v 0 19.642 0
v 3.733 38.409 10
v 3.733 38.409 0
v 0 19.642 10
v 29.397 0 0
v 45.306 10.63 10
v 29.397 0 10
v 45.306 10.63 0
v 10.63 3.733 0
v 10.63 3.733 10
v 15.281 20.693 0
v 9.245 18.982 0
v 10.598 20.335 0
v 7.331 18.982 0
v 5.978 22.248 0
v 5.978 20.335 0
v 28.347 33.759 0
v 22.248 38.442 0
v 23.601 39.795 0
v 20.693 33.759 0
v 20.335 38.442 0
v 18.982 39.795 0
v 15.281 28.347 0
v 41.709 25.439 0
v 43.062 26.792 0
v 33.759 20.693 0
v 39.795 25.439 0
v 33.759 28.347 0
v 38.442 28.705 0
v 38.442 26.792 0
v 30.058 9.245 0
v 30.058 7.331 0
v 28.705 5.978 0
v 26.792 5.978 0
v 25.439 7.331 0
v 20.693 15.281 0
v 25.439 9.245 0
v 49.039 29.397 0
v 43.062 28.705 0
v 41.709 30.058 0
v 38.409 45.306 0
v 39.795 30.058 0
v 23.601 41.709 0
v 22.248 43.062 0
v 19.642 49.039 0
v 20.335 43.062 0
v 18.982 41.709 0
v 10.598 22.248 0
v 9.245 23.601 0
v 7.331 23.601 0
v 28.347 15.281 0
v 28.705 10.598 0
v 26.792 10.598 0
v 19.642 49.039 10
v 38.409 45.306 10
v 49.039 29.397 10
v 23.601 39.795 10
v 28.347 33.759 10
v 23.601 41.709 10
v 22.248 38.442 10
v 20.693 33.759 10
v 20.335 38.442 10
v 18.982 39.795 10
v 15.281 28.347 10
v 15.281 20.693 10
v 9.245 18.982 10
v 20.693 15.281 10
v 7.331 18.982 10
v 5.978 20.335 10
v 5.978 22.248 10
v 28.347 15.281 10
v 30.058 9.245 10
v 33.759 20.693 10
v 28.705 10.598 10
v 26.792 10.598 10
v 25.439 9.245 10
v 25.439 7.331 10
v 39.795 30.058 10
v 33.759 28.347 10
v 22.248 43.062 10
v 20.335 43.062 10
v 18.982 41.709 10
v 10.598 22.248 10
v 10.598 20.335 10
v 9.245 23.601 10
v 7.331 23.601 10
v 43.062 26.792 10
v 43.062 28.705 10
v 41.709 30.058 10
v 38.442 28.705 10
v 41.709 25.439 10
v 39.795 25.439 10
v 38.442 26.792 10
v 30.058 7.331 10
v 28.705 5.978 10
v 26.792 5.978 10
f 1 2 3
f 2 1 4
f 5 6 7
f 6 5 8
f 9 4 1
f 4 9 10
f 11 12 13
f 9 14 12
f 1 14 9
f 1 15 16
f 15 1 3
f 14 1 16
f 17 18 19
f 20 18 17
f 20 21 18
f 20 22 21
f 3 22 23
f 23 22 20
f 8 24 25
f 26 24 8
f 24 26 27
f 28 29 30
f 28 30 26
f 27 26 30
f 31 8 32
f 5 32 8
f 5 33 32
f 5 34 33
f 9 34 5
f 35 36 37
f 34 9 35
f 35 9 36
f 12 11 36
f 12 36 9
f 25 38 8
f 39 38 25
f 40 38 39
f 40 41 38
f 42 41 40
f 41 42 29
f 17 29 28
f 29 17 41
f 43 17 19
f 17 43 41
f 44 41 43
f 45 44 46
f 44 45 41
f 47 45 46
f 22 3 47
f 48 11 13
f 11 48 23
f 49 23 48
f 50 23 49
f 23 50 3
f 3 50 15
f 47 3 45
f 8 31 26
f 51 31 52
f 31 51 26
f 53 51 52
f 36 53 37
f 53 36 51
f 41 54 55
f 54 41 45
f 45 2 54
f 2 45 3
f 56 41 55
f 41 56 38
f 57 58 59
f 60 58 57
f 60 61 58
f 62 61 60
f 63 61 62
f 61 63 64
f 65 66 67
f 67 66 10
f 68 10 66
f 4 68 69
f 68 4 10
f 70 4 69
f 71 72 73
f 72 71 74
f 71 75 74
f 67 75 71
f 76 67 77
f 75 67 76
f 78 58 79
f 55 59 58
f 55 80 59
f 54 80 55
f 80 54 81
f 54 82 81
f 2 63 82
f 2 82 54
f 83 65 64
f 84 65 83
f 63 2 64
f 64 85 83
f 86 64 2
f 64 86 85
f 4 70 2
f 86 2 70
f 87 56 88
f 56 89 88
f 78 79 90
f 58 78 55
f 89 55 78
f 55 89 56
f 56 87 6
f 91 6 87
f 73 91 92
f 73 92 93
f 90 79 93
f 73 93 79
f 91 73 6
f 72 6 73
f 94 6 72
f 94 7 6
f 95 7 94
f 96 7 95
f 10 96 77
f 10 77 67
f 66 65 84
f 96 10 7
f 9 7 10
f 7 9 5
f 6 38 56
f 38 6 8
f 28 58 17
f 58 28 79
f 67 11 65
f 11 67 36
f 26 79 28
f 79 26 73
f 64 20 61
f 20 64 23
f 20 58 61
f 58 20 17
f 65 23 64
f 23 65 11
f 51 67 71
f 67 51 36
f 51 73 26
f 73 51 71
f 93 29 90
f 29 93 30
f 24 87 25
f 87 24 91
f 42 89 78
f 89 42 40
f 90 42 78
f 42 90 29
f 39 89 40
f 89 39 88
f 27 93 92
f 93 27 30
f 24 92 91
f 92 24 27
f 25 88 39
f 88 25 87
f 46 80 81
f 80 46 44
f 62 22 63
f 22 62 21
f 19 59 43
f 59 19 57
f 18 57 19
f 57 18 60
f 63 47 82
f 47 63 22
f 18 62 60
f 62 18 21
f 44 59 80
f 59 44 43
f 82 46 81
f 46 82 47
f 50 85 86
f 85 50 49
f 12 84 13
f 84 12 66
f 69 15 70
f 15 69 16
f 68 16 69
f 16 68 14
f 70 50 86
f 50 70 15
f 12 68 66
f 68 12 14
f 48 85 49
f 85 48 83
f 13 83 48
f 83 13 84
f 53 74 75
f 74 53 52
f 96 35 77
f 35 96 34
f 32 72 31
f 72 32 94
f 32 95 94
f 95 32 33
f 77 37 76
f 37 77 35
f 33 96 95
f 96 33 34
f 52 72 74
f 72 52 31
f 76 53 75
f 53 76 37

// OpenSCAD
$fn = 32;

// ----------------------------------------------------------------------
// Polygon plate: 8-gon R25, 4 bolt windows
// ----------------------------------------------------------------------

// --- parameters (mm) ---
sides = 8;                // number of polygon sides
plate_r = 25;             // circumscribed radius of the polygon
bore_r = 10;              // centre bore radius
bolts = 4;                // number of bolt windows
ring_r = 16.55;           // bolt-circle radius
bolt_r = 2.5;             // bolt window radius
plate_t = 10;             // plate thickness, Z (extrusion height)

plate_d = 2 * plate_r;  // circumscribed diameter
bore_d = 2 * bore_r;  // centre bore diameter
bolt_d = 2 * bolt_r;  // bolt window diameter
ring_d = 2 * ring_r;  // bolt-circle diameter

profile = [[49.039, 29.397], [38.409, 45.306], [19.642, 49.039], [3.733, 38.409], [0, 19.642], [10.63, 3.733], [29.397, 0], [45.306, 10.63]];  // primary outline, 8 points, counter clockwise
void_1 = [[33.759, 28.347], [28.347, 33.759], [20.693, 33.759], [15.281, 28.347], [15.281, 20.693], [20.693, 15.281], [28.347, 15.281], [33.759, 20.693]];  // centre bore, 8 points
void_2 = [[43.062, 28.705], [41.709, 30.058], [39.795, 30.058], [38.442, 28.705], [38.442, 26.792], [39.795, 25.439], [41.709, 25.439], [43.062, 26.792]];  // bolt window 1, 8 points
void_3 = [[23.601, 41.709], [22.248, 43.062], [20.335, 43.062], [18.982, 41.709], [18.982, 39.795], [20.335, 38.442], [22.248, 38.442], [23.601, 39.795]];  // bolt window 2, 8 points
void_4 = [[10.598, 22.248], [9.245, 23.601], [7.331, 23.601], [5.978, 22.248], [5.978, 20.335], [7.331, 18.982], [9.245, 18.982], [10.598, 20.335]];  // bolt window 3, 8 points
void_5 = [[30.058, 9.245], [28.705, 10.598], [26.792, 10.598], [25.439, 9.245], [25.439, 7.331], [26.792, 5.978], [28.705, 5.978], [30.058, 7.331]];  // bolt window 4, 8 points

// --- the one profile operation ---
difference() {
  linear_extrude(height = plate_t) polygon(points = profile);
  translate([0, 0, -1])
    linear_extrude(height = plate_t + 2) polygon(points = void_1);
  translate([0, 0, -1])
    linear_extrude(height = plate_t + 2) polygon(points = void_2);
  translate([0, 0, -1])
    linear_extrude(height = plate_t + 2) polygon(points = void_3);
  translate([0, 0, -1])
    linear_extrude(height = plate_t + 2) polygon(points = void_4);
  translate([0, 0, -1])
    linear_extrude(height = plate_t + 2) polygon(points = void_5);
}
